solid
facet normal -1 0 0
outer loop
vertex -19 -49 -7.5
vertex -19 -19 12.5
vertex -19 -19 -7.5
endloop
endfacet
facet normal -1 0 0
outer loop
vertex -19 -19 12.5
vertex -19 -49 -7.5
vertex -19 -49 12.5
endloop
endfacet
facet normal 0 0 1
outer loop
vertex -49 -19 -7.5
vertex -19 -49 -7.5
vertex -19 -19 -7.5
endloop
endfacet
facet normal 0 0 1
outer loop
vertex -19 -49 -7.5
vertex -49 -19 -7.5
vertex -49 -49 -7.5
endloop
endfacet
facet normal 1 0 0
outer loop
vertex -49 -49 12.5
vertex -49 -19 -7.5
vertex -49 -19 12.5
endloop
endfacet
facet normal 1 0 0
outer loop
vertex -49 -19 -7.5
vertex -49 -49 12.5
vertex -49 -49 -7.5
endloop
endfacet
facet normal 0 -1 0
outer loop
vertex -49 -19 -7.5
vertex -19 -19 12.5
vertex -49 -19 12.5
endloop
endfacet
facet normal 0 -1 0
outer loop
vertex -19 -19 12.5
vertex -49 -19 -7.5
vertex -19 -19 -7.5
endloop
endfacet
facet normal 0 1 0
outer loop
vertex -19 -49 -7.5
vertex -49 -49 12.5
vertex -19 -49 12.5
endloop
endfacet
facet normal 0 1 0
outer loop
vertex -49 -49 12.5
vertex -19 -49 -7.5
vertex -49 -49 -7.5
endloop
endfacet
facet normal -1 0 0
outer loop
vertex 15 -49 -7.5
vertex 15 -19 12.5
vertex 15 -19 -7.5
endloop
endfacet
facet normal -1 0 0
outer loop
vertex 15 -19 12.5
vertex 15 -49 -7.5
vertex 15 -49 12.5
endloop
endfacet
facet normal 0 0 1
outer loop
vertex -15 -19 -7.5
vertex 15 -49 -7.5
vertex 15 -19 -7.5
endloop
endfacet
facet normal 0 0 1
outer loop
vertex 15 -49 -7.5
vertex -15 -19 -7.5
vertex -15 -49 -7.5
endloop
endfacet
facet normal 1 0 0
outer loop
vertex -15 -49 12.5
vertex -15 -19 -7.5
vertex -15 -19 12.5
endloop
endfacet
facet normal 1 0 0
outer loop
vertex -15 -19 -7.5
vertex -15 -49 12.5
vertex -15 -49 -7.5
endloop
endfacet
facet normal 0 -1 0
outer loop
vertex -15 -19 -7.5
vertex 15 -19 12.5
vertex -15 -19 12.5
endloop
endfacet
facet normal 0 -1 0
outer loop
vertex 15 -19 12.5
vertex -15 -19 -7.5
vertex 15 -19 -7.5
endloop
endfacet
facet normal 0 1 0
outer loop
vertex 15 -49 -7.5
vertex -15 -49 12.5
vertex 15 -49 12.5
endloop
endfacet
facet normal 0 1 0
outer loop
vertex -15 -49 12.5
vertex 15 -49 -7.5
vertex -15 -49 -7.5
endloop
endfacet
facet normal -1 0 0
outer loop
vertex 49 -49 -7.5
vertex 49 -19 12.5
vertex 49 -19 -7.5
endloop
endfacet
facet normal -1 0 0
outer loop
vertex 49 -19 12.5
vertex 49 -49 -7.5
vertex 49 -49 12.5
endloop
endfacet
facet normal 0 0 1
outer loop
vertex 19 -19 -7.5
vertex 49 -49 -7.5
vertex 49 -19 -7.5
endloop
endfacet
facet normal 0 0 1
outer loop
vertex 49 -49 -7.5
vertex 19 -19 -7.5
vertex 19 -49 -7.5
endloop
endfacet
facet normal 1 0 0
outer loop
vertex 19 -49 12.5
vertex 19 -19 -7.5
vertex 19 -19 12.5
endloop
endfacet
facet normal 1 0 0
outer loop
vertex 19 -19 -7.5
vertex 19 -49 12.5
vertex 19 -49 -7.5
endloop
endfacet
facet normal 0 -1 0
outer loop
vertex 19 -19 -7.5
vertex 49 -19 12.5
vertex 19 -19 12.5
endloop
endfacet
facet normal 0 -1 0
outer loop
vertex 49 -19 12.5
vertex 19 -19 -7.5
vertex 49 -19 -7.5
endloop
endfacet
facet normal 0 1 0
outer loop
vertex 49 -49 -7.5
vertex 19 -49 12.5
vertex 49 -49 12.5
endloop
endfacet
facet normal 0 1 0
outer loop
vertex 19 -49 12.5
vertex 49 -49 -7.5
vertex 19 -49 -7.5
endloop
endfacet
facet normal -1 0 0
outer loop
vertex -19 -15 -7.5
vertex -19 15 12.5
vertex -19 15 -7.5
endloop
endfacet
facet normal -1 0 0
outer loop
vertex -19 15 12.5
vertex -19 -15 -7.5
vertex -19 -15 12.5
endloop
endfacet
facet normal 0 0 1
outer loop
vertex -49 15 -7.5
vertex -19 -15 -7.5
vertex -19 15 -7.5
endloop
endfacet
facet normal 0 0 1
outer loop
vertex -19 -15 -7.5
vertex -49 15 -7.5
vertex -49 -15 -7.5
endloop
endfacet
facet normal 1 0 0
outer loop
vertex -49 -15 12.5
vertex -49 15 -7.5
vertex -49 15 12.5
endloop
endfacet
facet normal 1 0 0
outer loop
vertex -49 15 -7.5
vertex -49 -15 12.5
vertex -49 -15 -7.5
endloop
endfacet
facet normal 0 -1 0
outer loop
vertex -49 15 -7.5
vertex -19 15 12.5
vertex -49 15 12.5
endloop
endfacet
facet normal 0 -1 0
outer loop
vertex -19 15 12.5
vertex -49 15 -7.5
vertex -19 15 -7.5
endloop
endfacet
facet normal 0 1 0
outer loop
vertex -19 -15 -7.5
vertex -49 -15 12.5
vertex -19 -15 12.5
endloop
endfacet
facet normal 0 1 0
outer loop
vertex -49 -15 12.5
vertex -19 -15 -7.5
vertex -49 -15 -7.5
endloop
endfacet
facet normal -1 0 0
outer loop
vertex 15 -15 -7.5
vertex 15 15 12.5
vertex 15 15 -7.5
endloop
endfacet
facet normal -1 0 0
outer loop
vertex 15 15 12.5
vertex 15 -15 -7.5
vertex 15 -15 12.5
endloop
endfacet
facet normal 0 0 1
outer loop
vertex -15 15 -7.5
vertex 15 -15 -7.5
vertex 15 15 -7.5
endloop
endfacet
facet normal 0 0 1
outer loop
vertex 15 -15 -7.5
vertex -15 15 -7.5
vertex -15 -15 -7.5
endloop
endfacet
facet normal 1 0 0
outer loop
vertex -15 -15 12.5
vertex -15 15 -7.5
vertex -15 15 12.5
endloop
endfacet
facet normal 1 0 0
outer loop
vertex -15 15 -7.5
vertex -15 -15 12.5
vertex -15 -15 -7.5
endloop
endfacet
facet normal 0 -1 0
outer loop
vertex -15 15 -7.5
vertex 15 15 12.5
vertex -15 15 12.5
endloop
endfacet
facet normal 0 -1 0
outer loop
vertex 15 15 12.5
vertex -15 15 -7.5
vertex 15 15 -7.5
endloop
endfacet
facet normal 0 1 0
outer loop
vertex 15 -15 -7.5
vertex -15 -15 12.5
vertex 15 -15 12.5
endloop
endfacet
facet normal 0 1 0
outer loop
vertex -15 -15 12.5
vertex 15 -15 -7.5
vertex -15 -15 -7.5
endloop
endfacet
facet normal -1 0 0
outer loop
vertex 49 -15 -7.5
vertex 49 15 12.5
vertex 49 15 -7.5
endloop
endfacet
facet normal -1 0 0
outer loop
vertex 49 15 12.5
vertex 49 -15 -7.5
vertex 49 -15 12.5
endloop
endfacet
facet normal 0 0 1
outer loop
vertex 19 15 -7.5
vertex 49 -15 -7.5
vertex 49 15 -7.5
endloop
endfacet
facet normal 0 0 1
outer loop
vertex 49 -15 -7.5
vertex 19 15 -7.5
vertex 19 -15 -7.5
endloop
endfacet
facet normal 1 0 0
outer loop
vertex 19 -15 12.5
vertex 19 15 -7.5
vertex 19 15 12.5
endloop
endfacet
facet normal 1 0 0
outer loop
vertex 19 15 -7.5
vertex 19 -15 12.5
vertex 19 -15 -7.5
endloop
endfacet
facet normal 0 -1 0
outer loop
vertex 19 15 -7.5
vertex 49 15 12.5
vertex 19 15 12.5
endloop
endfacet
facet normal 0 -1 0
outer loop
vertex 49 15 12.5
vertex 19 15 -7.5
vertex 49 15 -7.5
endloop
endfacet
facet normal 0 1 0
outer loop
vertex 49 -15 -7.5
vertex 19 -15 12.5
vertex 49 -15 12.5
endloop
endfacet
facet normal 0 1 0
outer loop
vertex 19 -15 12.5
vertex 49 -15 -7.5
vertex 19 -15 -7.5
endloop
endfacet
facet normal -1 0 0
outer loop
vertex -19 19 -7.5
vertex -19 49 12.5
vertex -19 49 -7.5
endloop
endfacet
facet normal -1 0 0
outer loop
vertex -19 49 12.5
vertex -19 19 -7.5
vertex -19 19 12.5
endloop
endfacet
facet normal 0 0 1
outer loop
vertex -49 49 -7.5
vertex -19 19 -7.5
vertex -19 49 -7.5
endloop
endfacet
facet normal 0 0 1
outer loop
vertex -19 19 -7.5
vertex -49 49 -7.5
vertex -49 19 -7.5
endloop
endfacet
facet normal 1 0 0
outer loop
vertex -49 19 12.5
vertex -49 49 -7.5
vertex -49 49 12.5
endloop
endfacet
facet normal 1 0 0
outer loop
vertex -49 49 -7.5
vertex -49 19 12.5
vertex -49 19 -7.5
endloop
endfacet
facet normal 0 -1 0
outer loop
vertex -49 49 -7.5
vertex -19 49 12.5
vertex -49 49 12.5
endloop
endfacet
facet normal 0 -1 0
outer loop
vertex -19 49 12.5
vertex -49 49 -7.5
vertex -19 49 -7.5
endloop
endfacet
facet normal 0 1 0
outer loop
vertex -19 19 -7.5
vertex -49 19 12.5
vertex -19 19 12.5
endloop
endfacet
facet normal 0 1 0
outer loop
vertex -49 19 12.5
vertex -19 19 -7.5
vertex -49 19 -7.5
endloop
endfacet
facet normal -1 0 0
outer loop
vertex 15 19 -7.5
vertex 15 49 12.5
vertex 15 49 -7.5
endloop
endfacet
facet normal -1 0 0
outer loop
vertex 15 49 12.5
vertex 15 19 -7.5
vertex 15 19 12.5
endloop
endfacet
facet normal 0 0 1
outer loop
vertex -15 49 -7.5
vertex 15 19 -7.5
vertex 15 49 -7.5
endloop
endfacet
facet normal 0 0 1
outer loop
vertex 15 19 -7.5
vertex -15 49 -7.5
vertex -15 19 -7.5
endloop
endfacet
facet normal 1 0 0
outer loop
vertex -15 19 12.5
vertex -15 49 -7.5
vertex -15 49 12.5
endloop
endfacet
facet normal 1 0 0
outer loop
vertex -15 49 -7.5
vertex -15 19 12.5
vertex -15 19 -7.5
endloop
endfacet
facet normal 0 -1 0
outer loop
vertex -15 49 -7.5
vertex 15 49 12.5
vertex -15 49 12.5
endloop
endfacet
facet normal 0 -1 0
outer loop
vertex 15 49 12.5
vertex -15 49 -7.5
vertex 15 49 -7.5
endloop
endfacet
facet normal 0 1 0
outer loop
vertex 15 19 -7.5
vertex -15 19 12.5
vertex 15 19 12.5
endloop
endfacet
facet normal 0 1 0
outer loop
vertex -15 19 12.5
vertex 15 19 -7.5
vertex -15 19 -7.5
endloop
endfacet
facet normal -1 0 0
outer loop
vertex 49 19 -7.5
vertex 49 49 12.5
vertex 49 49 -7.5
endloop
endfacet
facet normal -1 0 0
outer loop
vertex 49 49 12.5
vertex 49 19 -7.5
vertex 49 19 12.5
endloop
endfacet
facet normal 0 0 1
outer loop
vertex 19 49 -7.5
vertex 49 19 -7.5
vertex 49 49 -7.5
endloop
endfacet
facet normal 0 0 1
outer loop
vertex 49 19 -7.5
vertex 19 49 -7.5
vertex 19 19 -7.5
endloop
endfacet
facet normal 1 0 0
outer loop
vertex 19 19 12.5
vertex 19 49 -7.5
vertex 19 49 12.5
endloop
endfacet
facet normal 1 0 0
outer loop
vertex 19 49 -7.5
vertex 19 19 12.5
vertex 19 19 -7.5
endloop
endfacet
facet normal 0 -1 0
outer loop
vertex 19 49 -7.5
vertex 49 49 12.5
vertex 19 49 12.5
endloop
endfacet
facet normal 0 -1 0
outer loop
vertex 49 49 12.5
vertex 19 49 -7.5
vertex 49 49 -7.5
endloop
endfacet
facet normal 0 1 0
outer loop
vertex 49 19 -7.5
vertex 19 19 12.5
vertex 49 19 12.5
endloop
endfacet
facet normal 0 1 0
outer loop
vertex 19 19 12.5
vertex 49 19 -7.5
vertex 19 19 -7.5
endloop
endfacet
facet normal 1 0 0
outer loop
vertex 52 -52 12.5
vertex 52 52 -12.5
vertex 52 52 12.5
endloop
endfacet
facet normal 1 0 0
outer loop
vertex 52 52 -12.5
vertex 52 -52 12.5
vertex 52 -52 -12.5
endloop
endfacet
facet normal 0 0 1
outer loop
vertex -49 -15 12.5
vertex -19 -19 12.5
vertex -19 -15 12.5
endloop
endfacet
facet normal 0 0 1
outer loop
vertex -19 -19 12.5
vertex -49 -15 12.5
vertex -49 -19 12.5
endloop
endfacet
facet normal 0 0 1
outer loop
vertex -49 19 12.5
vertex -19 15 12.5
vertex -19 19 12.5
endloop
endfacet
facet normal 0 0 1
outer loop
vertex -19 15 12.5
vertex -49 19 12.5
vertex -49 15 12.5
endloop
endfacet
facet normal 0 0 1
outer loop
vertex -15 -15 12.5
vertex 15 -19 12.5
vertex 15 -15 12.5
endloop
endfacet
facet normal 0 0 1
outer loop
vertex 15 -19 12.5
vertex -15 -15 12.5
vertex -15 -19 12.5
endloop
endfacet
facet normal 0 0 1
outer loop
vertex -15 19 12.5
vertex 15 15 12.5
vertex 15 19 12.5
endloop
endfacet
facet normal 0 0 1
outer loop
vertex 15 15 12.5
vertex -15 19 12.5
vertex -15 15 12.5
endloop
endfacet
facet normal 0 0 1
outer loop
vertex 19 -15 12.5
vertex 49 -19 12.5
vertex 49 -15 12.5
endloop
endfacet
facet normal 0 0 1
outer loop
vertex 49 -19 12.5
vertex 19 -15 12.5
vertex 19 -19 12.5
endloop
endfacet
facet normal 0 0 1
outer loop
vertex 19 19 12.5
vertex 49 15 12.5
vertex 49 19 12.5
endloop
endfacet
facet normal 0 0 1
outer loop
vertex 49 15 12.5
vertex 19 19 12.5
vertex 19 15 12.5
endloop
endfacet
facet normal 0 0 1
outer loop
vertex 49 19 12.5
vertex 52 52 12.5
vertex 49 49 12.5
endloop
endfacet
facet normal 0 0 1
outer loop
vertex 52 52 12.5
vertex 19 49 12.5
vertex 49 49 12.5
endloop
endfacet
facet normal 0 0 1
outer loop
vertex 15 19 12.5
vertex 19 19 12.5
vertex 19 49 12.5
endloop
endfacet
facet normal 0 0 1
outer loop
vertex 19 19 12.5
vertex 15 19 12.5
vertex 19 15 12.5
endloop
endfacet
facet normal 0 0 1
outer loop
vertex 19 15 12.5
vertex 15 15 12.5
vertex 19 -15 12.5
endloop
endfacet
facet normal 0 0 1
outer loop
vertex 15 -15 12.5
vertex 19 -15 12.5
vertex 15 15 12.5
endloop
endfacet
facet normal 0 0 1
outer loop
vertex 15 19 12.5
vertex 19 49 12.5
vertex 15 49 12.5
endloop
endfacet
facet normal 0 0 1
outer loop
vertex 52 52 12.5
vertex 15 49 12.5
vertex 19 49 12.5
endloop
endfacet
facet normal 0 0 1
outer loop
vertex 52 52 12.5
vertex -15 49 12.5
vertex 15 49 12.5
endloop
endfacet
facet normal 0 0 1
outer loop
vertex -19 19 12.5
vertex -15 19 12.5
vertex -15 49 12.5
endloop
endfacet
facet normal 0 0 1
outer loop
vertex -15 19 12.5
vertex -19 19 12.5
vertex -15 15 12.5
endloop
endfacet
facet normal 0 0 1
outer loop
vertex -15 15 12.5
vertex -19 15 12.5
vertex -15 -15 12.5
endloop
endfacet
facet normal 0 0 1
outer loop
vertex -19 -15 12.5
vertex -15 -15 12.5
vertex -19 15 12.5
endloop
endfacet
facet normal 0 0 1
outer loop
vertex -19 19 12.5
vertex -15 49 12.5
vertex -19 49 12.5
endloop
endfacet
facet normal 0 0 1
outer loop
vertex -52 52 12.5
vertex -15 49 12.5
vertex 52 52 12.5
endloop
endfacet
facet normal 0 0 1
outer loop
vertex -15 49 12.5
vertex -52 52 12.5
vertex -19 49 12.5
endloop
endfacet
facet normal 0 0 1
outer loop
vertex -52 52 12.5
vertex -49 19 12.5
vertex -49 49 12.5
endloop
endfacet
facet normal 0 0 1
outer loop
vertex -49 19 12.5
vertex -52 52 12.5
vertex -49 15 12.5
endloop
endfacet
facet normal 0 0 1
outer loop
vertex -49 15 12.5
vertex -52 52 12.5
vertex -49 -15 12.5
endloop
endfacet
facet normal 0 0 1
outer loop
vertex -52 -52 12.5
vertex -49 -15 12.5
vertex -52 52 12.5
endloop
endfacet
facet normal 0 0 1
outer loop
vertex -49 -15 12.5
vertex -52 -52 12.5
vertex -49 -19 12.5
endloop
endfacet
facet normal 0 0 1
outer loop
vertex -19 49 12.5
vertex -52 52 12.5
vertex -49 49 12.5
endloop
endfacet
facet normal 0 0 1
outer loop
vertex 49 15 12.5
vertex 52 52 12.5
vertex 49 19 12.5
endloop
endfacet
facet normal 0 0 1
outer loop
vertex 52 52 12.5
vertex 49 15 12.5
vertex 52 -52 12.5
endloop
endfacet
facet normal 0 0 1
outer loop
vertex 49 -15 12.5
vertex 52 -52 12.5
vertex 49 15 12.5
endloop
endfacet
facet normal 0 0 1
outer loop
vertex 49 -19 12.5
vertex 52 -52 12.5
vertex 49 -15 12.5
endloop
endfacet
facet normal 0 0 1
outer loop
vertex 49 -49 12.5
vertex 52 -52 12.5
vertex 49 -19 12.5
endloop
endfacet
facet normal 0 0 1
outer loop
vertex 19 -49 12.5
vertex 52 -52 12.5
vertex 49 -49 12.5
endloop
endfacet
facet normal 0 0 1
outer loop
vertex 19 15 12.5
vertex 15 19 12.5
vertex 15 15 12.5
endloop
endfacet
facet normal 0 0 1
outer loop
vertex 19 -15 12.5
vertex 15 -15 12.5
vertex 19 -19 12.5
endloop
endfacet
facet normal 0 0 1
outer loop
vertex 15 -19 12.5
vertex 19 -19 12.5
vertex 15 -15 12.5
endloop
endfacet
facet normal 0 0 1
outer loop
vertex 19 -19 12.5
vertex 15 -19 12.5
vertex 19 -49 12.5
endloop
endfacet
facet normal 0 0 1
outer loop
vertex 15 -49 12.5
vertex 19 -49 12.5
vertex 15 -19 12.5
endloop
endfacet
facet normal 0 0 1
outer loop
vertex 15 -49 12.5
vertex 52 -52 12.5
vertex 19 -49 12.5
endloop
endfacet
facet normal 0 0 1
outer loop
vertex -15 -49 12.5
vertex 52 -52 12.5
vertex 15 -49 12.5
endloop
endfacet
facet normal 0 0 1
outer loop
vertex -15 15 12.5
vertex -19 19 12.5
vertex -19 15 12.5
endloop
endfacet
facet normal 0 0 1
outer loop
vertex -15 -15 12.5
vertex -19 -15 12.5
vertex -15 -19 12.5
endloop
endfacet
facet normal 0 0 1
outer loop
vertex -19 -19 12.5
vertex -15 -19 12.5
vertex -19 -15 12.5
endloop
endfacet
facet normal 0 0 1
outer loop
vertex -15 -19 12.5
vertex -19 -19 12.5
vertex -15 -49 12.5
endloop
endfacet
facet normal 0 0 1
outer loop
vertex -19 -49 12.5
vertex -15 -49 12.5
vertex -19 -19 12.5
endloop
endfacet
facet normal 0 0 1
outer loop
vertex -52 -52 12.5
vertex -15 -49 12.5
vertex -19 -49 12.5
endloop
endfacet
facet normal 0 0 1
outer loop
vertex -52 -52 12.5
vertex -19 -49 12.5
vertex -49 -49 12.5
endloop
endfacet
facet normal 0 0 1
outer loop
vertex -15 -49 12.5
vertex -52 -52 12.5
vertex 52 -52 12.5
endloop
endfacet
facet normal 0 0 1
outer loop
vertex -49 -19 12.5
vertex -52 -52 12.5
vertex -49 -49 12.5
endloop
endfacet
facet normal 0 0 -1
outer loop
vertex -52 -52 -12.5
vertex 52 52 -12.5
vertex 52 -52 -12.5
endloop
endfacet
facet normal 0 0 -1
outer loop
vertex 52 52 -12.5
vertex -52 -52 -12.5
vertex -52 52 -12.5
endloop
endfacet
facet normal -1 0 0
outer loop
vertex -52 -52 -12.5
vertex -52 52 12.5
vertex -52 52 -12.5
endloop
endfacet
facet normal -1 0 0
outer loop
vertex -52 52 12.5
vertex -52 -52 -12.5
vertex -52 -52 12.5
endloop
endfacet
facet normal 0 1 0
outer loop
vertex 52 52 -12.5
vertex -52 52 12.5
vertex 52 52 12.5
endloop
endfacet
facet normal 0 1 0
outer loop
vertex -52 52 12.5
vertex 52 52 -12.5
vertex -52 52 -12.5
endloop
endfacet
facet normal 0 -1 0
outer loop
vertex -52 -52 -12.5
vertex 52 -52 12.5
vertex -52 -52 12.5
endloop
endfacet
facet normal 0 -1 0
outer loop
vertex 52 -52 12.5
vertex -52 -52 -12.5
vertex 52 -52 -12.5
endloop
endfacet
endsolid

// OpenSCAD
$fn = 32;

// ----------------------------------------------------------------------
// Pocket plate 104 x 104 x 25
// 3 x 3 pockets 30 mm square, 20 mm deep
// ----------------------------------------------------------------------

// --- parameters (mm) ---
thickness = 25;  // plate thickness
floor_t = 5;     // material left under each pocket
pocket = 30;     // pocket side length
pitch_x = 34;    // pocket pitch along X
pitch_y = 34;    // pocket pitch along Y
cols = 3;        // pockets per row
rows = 3;        // rows of pockets

// --- derived feature positions (mm) ---
depth = thickness - floor_t;        // = 20   pocket depth, down to the floor
span_x = (cols - 1) * pitch_x;      // = 68   distance between outer pockets
span_y = (rows - 1) * pitch_y;      // = 68   distance between outer pocket rows
origin_x = -span_x / 2;             // = -34   X of the first pocket
origin_y = -span_y / 2;             // = -34   Y of the first pocket
plate = [span_x + pocket + 6, span_y + pocket + 6, thickness];  // = [104, 104, 25]   overall size: pockets plus 3 mm of wall on each side
feature_centers = [
  [origin_x + 0 * pitch_x, origin_y + 0 * pitch_y],
  [origin_x + 1 * pitch_x, origin_y + 0 * pitch_y],
  [origin_x + 2 * pitch_x, origin_y + 0 * pitch_y],
  [origin_x + 0 * pitch_x, origin_y + 1 * pitch_y],
  [origin_x + 1 * pitch_x, origin_y + 1 * pitch_y],
  [origin_x + 2 * pitch_x, origin_y + 1 * pitch_y],
  [origin_x + 0 * pitch_x, origin_y + 2 * pitch_y],
  [origin_x + 1 * pitch_x, origin_y + 2 * pitch_y],
  [origin_x + 2 * pitch_x, origin_y + 2 * pitch_y]
];   // pocket centres, used verbatim by the cutter loop

// plate outline, then one pocket per centre in feature_centers
difference() {
  cube(plate, center = true);
  for (centre = feature_centers)
    translate([centre[0] - pocket / 2, centre[1] - pocket / 2, plate[2] / 2 - depth])
      cube([pocket, pocket, depth + 1]);  // centred on the declared pocket centre
}
